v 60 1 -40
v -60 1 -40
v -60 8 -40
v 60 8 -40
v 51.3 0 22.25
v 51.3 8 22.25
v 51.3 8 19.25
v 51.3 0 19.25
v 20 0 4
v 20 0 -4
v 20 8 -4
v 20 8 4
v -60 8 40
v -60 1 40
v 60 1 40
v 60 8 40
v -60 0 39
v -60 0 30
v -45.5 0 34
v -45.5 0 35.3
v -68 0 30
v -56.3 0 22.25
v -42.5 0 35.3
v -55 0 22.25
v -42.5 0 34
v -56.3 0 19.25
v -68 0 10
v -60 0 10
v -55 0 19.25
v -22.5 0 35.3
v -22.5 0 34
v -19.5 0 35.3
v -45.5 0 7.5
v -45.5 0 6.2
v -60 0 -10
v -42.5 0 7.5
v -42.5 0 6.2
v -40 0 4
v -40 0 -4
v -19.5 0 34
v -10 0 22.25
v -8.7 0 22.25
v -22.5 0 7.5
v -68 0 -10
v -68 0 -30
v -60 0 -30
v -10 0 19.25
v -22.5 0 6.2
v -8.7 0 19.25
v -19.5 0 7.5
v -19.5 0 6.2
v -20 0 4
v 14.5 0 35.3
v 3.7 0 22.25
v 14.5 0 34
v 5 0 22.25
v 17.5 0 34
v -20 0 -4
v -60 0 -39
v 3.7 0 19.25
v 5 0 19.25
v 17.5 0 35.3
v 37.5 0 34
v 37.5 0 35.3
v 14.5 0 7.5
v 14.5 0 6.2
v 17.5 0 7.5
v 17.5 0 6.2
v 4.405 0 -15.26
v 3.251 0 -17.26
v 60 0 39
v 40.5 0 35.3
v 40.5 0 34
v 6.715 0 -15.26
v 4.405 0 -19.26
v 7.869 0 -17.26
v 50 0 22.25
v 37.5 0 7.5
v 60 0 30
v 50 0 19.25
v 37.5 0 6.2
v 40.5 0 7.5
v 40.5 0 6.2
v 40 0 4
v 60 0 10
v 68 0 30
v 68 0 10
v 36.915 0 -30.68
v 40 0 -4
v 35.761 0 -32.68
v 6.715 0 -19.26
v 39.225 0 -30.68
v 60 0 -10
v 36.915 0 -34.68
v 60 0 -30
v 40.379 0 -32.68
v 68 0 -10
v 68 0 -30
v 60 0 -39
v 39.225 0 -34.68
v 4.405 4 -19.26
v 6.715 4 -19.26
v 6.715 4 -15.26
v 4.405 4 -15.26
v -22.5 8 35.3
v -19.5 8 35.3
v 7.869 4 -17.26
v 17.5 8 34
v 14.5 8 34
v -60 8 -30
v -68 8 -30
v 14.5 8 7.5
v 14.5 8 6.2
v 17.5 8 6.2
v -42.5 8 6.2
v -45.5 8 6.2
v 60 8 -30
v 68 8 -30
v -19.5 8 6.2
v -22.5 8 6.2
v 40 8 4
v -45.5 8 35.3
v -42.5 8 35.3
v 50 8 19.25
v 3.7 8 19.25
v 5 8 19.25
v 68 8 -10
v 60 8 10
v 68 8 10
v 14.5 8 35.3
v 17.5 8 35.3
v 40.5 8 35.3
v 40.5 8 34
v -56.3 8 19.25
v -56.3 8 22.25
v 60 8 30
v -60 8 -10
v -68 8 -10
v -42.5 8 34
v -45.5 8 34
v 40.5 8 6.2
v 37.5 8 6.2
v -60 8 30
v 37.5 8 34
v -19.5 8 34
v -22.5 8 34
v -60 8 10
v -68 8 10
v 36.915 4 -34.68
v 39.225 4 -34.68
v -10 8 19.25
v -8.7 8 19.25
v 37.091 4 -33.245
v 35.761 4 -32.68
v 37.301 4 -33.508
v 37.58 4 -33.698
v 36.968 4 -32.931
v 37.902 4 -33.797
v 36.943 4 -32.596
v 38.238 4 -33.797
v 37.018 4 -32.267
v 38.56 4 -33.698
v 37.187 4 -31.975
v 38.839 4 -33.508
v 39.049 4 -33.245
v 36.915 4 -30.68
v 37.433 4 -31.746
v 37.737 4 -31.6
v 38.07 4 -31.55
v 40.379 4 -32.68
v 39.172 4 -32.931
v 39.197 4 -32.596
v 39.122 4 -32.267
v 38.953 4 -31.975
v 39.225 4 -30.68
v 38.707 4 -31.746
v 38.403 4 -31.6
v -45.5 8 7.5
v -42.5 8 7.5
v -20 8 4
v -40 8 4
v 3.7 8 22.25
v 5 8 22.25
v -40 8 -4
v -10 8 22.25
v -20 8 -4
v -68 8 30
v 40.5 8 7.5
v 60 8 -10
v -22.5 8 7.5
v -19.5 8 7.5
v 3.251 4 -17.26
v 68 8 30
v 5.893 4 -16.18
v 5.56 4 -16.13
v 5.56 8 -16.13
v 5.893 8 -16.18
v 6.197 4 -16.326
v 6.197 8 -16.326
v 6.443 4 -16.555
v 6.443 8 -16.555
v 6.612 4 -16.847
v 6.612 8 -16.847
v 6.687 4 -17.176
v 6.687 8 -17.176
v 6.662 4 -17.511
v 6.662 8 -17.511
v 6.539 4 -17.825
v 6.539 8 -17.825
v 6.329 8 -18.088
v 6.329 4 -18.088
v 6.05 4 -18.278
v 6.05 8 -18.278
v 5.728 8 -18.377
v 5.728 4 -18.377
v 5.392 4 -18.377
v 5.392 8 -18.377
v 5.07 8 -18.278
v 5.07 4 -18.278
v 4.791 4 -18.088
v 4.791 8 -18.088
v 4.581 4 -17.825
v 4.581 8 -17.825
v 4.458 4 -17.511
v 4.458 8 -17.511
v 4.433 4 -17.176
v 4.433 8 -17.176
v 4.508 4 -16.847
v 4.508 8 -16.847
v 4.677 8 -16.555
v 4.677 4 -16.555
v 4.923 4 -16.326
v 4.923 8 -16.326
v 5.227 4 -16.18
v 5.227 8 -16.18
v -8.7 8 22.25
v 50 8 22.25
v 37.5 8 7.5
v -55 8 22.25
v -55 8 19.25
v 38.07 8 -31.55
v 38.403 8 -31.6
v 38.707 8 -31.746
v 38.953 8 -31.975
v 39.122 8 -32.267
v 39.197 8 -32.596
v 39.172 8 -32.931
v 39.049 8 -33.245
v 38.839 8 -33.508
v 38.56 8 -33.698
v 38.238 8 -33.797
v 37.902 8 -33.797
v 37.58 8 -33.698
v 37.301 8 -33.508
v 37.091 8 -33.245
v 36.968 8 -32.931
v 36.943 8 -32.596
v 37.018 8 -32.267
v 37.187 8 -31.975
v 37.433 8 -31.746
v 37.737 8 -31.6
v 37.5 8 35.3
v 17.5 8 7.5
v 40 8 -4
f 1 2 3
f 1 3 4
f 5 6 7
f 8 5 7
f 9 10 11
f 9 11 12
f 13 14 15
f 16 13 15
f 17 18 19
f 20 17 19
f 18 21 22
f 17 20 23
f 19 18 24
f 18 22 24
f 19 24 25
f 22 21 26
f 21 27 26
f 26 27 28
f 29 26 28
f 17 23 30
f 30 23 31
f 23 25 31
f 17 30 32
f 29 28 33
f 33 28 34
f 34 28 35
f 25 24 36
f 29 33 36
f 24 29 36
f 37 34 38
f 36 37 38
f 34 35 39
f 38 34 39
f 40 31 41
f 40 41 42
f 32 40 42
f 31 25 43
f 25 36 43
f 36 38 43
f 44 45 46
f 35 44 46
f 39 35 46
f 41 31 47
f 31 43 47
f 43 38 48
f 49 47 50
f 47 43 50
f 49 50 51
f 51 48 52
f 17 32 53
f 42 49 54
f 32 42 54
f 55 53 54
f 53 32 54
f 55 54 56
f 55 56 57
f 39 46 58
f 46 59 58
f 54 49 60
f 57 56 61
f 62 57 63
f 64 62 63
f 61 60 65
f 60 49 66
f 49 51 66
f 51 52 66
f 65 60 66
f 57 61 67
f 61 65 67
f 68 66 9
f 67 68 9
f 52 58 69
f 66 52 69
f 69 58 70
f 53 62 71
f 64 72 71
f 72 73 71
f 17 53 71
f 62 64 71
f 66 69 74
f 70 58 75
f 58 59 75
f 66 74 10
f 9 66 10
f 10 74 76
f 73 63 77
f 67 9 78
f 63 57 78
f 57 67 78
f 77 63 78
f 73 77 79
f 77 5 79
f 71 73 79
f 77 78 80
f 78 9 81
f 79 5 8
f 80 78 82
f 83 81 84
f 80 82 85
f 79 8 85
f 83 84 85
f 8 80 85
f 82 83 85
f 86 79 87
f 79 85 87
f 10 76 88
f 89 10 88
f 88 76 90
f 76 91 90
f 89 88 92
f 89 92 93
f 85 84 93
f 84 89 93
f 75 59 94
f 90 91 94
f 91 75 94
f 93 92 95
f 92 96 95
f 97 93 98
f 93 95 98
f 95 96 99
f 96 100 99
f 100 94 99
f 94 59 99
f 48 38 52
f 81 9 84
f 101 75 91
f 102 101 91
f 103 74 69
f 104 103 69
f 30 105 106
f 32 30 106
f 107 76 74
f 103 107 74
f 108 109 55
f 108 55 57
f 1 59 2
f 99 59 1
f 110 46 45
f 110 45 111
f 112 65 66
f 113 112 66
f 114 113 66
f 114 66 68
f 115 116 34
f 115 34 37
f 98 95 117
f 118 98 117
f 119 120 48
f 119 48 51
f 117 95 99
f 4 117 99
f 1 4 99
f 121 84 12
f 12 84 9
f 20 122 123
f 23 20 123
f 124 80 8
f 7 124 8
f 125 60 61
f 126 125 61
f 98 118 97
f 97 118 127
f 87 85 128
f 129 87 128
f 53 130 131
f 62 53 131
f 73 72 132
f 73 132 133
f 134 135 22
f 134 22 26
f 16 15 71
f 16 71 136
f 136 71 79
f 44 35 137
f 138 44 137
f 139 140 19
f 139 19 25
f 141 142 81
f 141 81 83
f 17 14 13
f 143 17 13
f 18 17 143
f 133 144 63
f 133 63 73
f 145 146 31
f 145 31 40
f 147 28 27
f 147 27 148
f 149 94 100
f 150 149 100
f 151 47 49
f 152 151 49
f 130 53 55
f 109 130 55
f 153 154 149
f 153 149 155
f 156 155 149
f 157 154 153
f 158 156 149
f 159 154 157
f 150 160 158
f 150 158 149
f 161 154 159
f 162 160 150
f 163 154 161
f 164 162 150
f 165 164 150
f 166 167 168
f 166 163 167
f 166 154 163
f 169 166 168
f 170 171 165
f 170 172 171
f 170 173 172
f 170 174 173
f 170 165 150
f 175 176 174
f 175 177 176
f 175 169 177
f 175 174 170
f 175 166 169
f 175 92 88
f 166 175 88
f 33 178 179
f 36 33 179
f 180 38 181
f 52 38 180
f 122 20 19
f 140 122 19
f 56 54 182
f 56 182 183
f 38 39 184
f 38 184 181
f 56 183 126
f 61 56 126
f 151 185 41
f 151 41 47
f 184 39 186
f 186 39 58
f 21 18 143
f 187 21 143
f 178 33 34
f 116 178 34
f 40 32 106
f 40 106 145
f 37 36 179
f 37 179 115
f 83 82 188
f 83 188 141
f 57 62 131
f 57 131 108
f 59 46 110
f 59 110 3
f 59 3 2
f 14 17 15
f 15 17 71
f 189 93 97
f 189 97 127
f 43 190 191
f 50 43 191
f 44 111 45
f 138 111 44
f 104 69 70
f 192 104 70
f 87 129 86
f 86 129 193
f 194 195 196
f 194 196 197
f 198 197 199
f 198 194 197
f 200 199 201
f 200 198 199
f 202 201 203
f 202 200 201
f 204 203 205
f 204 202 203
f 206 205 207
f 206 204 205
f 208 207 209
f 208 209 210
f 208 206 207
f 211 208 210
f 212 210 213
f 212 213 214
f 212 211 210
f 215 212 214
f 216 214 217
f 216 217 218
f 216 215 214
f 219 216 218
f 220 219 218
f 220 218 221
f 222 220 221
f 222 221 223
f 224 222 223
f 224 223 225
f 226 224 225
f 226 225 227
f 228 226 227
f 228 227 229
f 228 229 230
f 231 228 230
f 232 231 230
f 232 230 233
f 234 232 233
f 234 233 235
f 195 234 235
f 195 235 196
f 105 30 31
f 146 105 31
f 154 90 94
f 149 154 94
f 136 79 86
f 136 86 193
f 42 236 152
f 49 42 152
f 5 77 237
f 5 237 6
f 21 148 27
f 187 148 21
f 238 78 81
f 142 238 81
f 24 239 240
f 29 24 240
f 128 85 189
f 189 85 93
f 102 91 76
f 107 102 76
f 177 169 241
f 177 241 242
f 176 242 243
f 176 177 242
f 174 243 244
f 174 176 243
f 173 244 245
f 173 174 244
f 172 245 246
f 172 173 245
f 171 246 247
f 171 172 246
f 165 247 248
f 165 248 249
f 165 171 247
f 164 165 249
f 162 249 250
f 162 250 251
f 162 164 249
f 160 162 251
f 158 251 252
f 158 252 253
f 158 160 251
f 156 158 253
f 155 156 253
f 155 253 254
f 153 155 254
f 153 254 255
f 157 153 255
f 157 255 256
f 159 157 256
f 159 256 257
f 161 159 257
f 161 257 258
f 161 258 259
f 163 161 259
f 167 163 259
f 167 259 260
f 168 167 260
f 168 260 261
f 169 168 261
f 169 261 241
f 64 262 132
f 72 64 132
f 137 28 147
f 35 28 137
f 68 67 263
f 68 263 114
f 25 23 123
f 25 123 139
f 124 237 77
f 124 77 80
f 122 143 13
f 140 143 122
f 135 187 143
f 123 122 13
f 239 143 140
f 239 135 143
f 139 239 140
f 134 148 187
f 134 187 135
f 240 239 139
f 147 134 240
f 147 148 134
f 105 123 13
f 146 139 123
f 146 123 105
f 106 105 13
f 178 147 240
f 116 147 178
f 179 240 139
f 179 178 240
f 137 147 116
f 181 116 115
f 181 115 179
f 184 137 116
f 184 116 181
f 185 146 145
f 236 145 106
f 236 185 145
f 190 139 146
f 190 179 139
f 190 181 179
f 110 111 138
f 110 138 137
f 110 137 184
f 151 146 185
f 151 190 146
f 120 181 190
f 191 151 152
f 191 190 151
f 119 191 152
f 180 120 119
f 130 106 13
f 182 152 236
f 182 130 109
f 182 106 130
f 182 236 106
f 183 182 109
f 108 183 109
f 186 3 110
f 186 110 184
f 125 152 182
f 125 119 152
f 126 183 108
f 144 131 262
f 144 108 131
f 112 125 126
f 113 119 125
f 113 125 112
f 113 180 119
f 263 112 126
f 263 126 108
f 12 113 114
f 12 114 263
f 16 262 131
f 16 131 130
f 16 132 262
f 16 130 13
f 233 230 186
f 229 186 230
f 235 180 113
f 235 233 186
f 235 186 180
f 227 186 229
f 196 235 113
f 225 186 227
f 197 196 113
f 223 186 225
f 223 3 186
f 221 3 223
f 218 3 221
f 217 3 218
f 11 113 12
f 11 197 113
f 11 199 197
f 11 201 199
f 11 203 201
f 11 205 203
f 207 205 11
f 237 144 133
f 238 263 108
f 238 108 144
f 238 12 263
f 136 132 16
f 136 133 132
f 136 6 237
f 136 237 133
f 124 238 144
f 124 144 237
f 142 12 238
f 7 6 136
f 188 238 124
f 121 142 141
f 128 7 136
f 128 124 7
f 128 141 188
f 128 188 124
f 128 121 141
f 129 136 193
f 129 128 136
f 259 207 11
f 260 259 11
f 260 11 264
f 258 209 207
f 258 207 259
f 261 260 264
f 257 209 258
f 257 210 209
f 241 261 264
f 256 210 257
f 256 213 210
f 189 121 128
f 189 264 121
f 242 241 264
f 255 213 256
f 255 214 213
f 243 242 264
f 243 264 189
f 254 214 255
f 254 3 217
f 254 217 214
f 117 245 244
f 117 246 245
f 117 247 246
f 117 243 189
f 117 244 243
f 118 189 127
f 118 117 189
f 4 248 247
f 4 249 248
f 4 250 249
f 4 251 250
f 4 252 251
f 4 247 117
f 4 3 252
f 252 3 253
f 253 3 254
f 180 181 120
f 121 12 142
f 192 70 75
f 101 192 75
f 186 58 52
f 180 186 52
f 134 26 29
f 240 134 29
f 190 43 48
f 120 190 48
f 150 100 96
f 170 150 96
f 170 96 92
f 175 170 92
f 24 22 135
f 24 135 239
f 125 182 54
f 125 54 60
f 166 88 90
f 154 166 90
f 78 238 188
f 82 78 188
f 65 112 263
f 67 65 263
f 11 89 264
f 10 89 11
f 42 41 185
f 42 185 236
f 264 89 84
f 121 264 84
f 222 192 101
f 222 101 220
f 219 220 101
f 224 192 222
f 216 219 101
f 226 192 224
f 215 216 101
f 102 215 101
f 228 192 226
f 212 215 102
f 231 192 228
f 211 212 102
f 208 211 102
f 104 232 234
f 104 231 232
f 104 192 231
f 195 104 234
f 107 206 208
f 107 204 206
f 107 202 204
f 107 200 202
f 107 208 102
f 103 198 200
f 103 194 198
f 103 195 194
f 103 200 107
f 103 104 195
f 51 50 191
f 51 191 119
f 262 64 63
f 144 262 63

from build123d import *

# Parameters (mm, degrees)
SKETCH1_W           = 120
SKETCH1_H           = 80
SKETCH1_R           = 1.13
SKETCH1_W_2         = 3
SKETCH1_H_2         = 1.3
SKETCH1_W_3         = 1.3
SKETCH1_H_3         = 3
BOSS_EXTRUDE1_DEPTH = 8
CUT_EXTRUDE1_DEPTH  = 4
CHAMFER1_SIZE       = 1
CUT_EXTRUDE2_REACH  = 74.553
SKETCH3_W           = 20
SKETCH3_H           = 8
SKETCH4_W           = 20
SKETCH4_H           = 8
BOSS_EXTRUDE2_DEPTH = 8


with BuildPart() as part:
    # Sketch1 → Boss-Extrude1 (new body)
    with BuildSketch(Plane(origin=(0, 0, 0), x_dir=(1, 0, 0), z_dir=(0, 1, 0))):
        Rectangle(SKETCH1_W, SKETCH1_H)
        with Locations(Location((38.07, 32.68, 0), (0, 0, 270))):
            Circle(SKETCH1_R, mode=Mode.SUBTRACT)
        with Locations(Location((5.56, 17.26, 0), (0, 0, 270))):
            Circle(SKETCH1_R, mode=Mode.SUBTRACT)
        with Locations((16, -34.65)):
            Rectangle(SKETCH1_W_2, SKETCH1_H_2, mode=Mode.SUBTRACT)
        with Locations((16, -6.85)):
            Rectangle(SKETCH1_W_2, SKETCH1_H_2, mode=Mode.SUBTRACT)
        with Locations((39, -6.85)):
            Rectangle(SKETCH1_W_2, SKETCH1_H_2, mode=Mode.SUBTRACT)
        with Locations((39, -34.65)):
            Rectangle(SKETCH1_W_2, SKETCH1_H_2, mode=Mode.SUBTRACT)
        with Locations((50.65, -20.75)):
            Rectangle(SKETCH1_W_3, SKETCH1_H_3, mode=Mode.SUBTRACT)
        with Locations((4.35, -20.75)):
            Rectangle(SKETCH1_W_3, SKETCH1_H_3, mode=Mode.SUBTRACT)
        with Locations((-55.65, -20.75)):
            Rectangle(SKETCH1_W_3, SKETCH1_H_3, mode=Mode.SUBTRACT)
        with Locations((-9.35, -20.75)):
            Rectangle(SKETCH1_W_3, SKETCH1_H_3, mode=Mode.SUBTRACT)
        with Locations((-44, -34.65)):
            Rectangle(SKETCH1_W_2, SKETCH1_H_2, mode=Mode.SUBTRACT)
        with Locations((-44, -6.85)):
            Rectangle(SKETCH1_W_2, SKETCH1_H_2, mode=Mode.SUBTRACT)
        with Locations((-21, -34.65)):
            Rectangle(SKETCH1_W_2, SKETCH1_H_2, mode=Mode.SUBTRACT)
        with Locations((-21, -6.85)):
            Rectangle(SKETCH1_W_2, SKETCH1_H_2, mode=Mode.SUBTRACT)
    extrude(amount=BOSS_EXTRUDE1_DEPTH)

    # Sketch2 → Cut-Extrude1 (cut)
    with BuildSketch(Plane.XZ):
        Polygon((7.869401077, -17.26), (6.714700538, -15.26), (4.405299462, -15.26), (3.250598923, -17.26), (4.405299462, -19.26), (6.714700538, -19.26), align=None)
        Polygon((40.379401077, -32.68), (39.224700538, -30.68), (36.915299462, -30.68), (35.760598923, -32.68), (36.915299462, -34.68), (39.224700538, -34.68), align=None)
    extrude(amount=-CUT_EXTRUDE1_DEPTH, mode=Mode.SUBTRACT)

    # Chamfer1
    chamfer1_edges = [part.edges().sort_by_distance(p)[0] for p in [
        (0, 0, -40),
        (0, 0, 40),
    ]]
    chamfer(chamfer1_edges, length=CHAMFER1_SIZE)

    # Sketch3 → Cut-Extrude2 (cut, up to next)
    with BuildSketch(Plane.XZ, mode=Mode.PRIVATE) as cut_extrude2_sk1:
        with Locations((-30, 0)):
            Rectangle(SKETCH3_W, SKETCH3_H)
    cut_extrude2_tool1 = extrude(cut_extrude2_sk1.sketch, amount=-CUT_EXTRUDE2_REACH, mode=Mode.PRIVATE) & part.part
    cut_extrude2 = cut_extrude2_tool1.solids().sort_by_distance((-30, 0, 0))[0]
    add(cut_extrude2, mode=Mode.SUBTRACT)

    # Mirror1: Cut-Extrude2 across plane
    add(cut_extrude2.mirror(Plane.ZY), mode=Mode.SUBTRACT)

    # Sketch4 → Boss-Extrude2 (add)
    with BuildSketch(Plane.ZY.offset(60)):
        with Locations((20, 4)):
            Rectangle(SKETCH4_W, SKETCH4_H)
        with Locations((-20, 4)):
            Rectangle(SKETCH4_W, SKETCH4_H)
    boss_extrude2 = extrude(amount=BOSS_EXTRUDE2_DEPTH)

    # Mirror2: Boss-Extrude2 across plane
    add(boss_extrude2.mirror(Plane.ZY))


solid = part.part
